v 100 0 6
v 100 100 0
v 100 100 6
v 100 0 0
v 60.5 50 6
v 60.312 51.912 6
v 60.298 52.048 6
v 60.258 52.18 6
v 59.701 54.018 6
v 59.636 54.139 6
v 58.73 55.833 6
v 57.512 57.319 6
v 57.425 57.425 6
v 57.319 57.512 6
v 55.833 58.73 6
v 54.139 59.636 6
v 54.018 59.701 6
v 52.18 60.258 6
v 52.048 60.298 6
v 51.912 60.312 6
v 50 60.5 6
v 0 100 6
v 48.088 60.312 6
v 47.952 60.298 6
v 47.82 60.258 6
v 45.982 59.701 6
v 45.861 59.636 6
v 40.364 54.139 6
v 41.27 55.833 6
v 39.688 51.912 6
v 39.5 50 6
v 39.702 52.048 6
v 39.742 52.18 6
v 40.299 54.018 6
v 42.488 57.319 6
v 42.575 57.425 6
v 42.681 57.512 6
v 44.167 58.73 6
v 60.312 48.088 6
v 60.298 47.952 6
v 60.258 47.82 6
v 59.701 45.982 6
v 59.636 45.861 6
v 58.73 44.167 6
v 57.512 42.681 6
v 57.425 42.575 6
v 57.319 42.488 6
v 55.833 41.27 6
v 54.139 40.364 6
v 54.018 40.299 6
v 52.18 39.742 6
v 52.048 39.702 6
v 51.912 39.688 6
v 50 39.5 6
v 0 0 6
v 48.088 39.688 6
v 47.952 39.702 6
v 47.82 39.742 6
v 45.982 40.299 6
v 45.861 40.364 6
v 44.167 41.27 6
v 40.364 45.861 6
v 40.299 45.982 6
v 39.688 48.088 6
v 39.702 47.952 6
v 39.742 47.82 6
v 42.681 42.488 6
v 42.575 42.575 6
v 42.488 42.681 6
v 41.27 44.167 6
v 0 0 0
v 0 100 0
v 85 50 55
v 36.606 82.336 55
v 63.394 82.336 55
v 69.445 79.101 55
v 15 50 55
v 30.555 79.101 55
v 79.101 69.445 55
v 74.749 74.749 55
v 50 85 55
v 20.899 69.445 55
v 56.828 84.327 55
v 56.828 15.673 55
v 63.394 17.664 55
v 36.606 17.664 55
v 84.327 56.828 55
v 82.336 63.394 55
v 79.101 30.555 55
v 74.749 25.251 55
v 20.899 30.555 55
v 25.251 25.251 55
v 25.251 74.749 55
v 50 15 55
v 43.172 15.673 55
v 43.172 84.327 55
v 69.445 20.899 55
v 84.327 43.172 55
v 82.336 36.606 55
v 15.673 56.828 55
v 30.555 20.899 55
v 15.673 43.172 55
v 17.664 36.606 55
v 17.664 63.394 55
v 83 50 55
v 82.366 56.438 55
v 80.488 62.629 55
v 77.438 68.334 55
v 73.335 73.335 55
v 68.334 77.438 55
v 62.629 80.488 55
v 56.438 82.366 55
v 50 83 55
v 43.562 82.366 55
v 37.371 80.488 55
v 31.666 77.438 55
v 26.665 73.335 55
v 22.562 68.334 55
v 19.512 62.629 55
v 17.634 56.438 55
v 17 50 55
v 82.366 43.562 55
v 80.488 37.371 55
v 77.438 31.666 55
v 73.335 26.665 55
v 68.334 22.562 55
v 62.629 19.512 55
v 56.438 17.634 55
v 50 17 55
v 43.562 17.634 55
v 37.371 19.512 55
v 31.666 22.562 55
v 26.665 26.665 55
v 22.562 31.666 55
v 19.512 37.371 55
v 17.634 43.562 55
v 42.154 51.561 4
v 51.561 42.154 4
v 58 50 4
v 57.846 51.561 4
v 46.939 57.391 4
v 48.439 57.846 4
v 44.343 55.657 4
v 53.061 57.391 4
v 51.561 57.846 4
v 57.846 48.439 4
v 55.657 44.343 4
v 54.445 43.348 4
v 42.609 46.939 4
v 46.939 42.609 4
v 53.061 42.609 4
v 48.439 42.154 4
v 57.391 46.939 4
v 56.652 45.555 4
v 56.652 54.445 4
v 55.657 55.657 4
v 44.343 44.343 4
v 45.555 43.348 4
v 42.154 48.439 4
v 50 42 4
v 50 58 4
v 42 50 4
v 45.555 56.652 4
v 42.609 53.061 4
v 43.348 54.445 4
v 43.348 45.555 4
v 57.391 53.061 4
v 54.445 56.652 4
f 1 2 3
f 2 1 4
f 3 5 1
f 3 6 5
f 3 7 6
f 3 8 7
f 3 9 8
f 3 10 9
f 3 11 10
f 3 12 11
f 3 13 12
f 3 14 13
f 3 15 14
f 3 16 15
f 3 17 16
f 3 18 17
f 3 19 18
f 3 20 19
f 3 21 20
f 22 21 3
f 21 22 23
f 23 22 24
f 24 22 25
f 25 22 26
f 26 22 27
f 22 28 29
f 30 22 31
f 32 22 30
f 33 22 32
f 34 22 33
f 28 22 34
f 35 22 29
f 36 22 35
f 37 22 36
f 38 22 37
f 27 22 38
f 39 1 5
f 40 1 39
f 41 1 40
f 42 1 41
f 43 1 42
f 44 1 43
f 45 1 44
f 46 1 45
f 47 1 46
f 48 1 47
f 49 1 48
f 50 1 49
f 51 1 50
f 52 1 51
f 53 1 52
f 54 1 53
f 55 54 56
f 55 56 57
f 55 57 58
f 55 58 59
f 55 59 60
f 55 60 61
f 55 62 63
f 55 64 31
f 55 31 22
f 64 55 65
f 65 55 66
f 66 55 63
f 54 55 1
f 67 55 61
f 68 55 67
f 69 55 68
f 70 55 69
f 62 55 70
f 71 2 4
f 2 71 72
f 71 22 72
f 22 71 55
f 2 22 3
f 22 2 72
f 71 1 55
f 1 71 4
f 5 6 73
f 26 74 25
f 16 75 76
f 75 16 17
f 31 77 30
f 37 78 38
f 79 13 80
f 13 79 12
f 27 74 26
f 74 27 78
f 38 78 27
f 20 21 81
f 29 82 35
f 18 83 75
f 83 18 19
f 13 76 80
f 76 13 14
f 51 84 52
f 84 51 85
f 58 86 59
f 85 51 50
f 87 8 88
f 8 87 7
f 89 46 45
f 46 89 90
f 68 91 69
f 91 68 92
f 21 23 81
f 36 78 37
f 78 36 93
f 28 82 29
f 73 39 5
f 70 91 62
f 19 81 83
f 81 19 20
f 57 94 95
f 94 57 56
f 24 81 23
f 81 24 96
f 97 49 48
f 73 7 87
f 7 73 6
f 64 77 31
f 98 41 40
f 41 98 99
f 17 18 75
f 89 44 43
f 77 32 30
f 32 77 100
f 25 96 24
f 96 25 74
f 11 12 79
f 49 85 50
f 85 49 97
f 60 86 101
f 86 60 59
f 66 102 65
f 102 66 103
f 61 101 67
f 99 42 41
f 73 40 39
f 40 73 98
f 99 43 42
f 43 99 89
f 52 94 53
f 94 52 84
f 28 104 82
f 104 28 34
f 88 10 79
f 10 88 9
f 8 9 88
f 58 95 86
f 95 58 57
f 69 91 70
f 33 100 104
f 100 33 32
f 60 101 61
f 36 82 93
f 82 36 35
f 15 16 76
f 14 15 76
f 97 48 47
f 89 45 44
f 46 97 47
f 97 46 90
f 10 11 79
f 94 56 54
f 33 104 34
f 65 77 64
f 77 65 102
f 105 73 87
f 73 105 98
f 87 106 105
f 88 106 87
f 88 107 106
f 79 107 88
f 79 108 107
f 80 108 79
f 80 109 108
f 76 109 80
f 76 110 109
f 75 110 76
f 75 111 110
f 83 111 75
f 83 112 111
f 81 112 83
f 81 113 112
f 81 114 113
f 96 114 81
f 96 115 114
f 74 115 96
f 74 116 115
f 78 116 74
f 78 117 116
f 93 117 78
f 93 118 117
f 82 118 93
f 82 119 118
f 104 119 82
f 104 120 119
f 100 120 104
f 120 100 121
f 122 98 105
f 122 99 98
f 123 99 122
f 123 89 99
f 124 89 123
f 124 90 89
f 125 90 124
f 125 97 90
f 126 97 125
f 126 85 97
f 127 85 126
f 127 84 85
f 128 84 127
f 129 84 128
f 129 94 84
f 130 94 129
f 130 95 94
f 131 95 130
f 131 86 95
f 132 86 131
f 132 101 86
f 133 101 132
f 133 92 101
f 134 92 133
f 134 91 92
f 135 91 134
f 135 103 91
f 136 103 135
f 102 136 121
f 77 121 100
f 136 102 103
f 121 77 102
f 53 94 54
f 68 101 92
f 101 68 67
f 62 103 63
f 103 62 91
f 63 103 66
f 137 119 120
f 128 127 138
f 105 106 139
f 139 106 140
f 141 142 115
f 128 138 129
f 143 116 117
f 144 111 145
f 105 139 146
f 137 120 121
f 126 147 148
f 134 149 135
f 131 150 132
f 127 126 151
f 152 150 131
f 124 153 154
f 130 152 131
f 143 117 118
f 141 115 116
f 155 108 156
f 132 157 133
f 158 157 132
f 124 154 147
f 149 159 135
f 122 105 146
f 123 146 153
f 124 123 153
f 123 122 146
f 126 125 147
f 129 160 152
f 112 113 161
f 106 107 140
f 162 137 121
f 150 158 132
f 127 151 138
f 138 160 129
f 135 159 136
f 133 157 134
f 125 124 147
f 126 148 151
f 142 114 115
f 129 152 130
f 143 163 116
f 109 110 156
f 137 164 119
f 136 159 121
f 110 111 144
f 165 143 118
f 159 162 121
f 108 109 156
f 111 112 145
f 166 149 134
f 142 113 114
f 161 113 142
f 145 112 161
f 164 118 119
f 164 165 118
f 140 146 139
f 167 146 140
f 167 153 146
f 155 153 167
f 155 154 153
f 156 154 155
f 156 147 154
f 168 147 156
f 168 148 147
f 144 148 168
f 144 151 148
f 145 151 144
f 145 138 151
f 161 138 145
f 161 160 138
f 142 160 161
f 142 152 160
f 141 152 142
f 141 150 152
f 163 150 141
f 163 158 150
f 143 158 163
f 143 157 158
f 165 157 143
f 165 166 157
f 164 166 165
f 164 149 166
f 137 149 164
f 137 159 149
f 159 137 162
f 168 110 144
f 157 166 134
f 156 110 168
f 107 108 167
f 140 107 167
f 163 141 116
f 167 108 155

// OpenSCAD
$fn = 32;

// ----------------------------------------------------------------------
// Hopper: funnel with square flange
// ----------------------------------------------------------------------

// --- parameters (mm) ---
fl = 100;                 // flange side, X and Y
fl_t = 6;                 // flange thickness
cone_h = 50;              // cone height above the flange
top_d = 70;               // cone mouth diameter
bot_d = 20;               // cone spout diameter
wall = 2;                 // cone wall thickness

bore_d = bot_d - 2 * wall;  // spout bore diameter
total_h = fl_t + cone_h - 1;  // overall height

difference() {
  union() {
    cube([fl, fl, fl_t]);
    translate([fl / 2, fl / 2, fl_t - 1])
      cylinder(h = cone_h, d1 = bot_d, d2 = top_d);
  }
  translate([fl / 2, fl / 2, fl_t - 2])
    cylinder(h = cone_h + 1, d1 = bore_d, d2 = top_d - 2 * wall);
}
